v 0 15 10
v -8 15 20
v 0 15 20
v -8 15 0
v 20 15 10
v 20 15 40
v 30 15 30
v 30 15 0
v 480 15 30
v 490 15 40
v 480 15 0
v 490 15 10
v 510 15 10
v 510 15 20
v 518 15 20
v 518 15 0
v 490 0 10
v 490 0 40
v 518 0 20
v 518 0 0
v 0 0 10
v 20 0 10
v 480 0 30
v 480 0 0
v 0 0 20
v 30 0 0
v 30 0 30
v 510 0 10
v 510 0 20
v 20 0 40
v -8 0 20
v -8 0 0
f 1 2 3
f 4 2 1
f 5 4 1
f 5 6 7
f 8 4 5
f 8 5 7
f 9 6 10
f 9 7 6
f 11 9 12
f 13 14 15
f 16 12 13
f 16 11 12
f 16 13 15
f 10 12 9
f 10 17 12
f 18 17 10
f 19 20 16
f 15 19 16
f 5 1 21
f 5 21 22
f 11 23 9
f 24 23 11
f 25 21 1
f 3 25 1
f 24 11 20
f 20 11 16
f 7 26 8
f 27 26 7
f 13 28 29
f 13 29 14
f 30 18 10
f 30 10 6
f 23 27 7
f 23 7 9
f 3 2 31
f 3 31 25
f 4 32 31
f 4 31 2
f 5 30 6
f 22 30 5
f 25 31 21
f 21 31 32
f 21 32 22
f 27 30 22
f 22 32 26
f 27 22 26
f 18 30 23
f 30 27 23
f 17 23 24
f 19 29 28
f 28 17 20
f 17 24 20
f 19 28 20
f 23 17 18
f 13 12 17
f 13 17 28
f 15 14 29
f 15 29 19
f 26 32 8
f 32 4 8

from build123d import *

# Parameters (mm, degrees)
SKETCH_1_W           = 510
SKETCH_1_H           = 15
EXTRUDE_1_DEPTH      = 10
EXTRUDE_2_DEPTH      = 10
EXTRUDE_2_DEPTH_BACK = 10
SKETCH_2_W           = 8
SKETCH_2_H           = 15
EXTRUDE_3_DEPTH      = 15
SKETCH_4_W           = 450
SKETCH_4_H           = 10
CUT_EXTRUDE_1_DEPTH  = 520.758597812


with BuildPart() as part:
    # 草图1 → 凸台-拉伸1 (new body)
    with BuildSketch(Plane.XY):
        with Locations((255, 7.5)):
            Rectangle(SKETCH_1_W, SKETCH_1_H)
    extrude(amount=EXTRUDE_1_DEPTH)

    # 草图2 → 凸台-拉伸2 (add, two sides: drawn at the far end of the back side and taken through both)
    with BuildSketch(Plane.XY.offset(10).offset(-EXTRUDE_2_DEPTH_BACK)):
        with Locations((514, 7.5)):
            Rectangle(SKETCH_2_W, SKETCH_2_H)
        with Locations((-4, 7.5)):
            Rectangle(SKETCH_2_W, SKETCH_2_H)
    extrude(amount=EXTRUDE_2_DEPTH + EXTRUDE_2_DEPTH_BACK)

    # 草图3 → 凸台-拉伸3 (add)
    with BuildSketch(Plane.XZ):
        Polygon((20, 40), (20, 10), (30, 10), (30, 30), (480, 30), (480, 10), (490, 10), (490, 40), align=None)
    extrude(amount=-EXTRUDE_3_DEPTH)

    # 草图4 → 切除-拉伸1 (cut, through all)
    with BuildSketch(Plane.XZ):
        with Locations((255, 5)):
            Rectangle(SKETCH_4_W, SKETCH_4_H)
    extrude(amount=-CUT_EXTRUDE_1_DEPTH, mode=Mode.SUBTRACT)


solid = part.part
